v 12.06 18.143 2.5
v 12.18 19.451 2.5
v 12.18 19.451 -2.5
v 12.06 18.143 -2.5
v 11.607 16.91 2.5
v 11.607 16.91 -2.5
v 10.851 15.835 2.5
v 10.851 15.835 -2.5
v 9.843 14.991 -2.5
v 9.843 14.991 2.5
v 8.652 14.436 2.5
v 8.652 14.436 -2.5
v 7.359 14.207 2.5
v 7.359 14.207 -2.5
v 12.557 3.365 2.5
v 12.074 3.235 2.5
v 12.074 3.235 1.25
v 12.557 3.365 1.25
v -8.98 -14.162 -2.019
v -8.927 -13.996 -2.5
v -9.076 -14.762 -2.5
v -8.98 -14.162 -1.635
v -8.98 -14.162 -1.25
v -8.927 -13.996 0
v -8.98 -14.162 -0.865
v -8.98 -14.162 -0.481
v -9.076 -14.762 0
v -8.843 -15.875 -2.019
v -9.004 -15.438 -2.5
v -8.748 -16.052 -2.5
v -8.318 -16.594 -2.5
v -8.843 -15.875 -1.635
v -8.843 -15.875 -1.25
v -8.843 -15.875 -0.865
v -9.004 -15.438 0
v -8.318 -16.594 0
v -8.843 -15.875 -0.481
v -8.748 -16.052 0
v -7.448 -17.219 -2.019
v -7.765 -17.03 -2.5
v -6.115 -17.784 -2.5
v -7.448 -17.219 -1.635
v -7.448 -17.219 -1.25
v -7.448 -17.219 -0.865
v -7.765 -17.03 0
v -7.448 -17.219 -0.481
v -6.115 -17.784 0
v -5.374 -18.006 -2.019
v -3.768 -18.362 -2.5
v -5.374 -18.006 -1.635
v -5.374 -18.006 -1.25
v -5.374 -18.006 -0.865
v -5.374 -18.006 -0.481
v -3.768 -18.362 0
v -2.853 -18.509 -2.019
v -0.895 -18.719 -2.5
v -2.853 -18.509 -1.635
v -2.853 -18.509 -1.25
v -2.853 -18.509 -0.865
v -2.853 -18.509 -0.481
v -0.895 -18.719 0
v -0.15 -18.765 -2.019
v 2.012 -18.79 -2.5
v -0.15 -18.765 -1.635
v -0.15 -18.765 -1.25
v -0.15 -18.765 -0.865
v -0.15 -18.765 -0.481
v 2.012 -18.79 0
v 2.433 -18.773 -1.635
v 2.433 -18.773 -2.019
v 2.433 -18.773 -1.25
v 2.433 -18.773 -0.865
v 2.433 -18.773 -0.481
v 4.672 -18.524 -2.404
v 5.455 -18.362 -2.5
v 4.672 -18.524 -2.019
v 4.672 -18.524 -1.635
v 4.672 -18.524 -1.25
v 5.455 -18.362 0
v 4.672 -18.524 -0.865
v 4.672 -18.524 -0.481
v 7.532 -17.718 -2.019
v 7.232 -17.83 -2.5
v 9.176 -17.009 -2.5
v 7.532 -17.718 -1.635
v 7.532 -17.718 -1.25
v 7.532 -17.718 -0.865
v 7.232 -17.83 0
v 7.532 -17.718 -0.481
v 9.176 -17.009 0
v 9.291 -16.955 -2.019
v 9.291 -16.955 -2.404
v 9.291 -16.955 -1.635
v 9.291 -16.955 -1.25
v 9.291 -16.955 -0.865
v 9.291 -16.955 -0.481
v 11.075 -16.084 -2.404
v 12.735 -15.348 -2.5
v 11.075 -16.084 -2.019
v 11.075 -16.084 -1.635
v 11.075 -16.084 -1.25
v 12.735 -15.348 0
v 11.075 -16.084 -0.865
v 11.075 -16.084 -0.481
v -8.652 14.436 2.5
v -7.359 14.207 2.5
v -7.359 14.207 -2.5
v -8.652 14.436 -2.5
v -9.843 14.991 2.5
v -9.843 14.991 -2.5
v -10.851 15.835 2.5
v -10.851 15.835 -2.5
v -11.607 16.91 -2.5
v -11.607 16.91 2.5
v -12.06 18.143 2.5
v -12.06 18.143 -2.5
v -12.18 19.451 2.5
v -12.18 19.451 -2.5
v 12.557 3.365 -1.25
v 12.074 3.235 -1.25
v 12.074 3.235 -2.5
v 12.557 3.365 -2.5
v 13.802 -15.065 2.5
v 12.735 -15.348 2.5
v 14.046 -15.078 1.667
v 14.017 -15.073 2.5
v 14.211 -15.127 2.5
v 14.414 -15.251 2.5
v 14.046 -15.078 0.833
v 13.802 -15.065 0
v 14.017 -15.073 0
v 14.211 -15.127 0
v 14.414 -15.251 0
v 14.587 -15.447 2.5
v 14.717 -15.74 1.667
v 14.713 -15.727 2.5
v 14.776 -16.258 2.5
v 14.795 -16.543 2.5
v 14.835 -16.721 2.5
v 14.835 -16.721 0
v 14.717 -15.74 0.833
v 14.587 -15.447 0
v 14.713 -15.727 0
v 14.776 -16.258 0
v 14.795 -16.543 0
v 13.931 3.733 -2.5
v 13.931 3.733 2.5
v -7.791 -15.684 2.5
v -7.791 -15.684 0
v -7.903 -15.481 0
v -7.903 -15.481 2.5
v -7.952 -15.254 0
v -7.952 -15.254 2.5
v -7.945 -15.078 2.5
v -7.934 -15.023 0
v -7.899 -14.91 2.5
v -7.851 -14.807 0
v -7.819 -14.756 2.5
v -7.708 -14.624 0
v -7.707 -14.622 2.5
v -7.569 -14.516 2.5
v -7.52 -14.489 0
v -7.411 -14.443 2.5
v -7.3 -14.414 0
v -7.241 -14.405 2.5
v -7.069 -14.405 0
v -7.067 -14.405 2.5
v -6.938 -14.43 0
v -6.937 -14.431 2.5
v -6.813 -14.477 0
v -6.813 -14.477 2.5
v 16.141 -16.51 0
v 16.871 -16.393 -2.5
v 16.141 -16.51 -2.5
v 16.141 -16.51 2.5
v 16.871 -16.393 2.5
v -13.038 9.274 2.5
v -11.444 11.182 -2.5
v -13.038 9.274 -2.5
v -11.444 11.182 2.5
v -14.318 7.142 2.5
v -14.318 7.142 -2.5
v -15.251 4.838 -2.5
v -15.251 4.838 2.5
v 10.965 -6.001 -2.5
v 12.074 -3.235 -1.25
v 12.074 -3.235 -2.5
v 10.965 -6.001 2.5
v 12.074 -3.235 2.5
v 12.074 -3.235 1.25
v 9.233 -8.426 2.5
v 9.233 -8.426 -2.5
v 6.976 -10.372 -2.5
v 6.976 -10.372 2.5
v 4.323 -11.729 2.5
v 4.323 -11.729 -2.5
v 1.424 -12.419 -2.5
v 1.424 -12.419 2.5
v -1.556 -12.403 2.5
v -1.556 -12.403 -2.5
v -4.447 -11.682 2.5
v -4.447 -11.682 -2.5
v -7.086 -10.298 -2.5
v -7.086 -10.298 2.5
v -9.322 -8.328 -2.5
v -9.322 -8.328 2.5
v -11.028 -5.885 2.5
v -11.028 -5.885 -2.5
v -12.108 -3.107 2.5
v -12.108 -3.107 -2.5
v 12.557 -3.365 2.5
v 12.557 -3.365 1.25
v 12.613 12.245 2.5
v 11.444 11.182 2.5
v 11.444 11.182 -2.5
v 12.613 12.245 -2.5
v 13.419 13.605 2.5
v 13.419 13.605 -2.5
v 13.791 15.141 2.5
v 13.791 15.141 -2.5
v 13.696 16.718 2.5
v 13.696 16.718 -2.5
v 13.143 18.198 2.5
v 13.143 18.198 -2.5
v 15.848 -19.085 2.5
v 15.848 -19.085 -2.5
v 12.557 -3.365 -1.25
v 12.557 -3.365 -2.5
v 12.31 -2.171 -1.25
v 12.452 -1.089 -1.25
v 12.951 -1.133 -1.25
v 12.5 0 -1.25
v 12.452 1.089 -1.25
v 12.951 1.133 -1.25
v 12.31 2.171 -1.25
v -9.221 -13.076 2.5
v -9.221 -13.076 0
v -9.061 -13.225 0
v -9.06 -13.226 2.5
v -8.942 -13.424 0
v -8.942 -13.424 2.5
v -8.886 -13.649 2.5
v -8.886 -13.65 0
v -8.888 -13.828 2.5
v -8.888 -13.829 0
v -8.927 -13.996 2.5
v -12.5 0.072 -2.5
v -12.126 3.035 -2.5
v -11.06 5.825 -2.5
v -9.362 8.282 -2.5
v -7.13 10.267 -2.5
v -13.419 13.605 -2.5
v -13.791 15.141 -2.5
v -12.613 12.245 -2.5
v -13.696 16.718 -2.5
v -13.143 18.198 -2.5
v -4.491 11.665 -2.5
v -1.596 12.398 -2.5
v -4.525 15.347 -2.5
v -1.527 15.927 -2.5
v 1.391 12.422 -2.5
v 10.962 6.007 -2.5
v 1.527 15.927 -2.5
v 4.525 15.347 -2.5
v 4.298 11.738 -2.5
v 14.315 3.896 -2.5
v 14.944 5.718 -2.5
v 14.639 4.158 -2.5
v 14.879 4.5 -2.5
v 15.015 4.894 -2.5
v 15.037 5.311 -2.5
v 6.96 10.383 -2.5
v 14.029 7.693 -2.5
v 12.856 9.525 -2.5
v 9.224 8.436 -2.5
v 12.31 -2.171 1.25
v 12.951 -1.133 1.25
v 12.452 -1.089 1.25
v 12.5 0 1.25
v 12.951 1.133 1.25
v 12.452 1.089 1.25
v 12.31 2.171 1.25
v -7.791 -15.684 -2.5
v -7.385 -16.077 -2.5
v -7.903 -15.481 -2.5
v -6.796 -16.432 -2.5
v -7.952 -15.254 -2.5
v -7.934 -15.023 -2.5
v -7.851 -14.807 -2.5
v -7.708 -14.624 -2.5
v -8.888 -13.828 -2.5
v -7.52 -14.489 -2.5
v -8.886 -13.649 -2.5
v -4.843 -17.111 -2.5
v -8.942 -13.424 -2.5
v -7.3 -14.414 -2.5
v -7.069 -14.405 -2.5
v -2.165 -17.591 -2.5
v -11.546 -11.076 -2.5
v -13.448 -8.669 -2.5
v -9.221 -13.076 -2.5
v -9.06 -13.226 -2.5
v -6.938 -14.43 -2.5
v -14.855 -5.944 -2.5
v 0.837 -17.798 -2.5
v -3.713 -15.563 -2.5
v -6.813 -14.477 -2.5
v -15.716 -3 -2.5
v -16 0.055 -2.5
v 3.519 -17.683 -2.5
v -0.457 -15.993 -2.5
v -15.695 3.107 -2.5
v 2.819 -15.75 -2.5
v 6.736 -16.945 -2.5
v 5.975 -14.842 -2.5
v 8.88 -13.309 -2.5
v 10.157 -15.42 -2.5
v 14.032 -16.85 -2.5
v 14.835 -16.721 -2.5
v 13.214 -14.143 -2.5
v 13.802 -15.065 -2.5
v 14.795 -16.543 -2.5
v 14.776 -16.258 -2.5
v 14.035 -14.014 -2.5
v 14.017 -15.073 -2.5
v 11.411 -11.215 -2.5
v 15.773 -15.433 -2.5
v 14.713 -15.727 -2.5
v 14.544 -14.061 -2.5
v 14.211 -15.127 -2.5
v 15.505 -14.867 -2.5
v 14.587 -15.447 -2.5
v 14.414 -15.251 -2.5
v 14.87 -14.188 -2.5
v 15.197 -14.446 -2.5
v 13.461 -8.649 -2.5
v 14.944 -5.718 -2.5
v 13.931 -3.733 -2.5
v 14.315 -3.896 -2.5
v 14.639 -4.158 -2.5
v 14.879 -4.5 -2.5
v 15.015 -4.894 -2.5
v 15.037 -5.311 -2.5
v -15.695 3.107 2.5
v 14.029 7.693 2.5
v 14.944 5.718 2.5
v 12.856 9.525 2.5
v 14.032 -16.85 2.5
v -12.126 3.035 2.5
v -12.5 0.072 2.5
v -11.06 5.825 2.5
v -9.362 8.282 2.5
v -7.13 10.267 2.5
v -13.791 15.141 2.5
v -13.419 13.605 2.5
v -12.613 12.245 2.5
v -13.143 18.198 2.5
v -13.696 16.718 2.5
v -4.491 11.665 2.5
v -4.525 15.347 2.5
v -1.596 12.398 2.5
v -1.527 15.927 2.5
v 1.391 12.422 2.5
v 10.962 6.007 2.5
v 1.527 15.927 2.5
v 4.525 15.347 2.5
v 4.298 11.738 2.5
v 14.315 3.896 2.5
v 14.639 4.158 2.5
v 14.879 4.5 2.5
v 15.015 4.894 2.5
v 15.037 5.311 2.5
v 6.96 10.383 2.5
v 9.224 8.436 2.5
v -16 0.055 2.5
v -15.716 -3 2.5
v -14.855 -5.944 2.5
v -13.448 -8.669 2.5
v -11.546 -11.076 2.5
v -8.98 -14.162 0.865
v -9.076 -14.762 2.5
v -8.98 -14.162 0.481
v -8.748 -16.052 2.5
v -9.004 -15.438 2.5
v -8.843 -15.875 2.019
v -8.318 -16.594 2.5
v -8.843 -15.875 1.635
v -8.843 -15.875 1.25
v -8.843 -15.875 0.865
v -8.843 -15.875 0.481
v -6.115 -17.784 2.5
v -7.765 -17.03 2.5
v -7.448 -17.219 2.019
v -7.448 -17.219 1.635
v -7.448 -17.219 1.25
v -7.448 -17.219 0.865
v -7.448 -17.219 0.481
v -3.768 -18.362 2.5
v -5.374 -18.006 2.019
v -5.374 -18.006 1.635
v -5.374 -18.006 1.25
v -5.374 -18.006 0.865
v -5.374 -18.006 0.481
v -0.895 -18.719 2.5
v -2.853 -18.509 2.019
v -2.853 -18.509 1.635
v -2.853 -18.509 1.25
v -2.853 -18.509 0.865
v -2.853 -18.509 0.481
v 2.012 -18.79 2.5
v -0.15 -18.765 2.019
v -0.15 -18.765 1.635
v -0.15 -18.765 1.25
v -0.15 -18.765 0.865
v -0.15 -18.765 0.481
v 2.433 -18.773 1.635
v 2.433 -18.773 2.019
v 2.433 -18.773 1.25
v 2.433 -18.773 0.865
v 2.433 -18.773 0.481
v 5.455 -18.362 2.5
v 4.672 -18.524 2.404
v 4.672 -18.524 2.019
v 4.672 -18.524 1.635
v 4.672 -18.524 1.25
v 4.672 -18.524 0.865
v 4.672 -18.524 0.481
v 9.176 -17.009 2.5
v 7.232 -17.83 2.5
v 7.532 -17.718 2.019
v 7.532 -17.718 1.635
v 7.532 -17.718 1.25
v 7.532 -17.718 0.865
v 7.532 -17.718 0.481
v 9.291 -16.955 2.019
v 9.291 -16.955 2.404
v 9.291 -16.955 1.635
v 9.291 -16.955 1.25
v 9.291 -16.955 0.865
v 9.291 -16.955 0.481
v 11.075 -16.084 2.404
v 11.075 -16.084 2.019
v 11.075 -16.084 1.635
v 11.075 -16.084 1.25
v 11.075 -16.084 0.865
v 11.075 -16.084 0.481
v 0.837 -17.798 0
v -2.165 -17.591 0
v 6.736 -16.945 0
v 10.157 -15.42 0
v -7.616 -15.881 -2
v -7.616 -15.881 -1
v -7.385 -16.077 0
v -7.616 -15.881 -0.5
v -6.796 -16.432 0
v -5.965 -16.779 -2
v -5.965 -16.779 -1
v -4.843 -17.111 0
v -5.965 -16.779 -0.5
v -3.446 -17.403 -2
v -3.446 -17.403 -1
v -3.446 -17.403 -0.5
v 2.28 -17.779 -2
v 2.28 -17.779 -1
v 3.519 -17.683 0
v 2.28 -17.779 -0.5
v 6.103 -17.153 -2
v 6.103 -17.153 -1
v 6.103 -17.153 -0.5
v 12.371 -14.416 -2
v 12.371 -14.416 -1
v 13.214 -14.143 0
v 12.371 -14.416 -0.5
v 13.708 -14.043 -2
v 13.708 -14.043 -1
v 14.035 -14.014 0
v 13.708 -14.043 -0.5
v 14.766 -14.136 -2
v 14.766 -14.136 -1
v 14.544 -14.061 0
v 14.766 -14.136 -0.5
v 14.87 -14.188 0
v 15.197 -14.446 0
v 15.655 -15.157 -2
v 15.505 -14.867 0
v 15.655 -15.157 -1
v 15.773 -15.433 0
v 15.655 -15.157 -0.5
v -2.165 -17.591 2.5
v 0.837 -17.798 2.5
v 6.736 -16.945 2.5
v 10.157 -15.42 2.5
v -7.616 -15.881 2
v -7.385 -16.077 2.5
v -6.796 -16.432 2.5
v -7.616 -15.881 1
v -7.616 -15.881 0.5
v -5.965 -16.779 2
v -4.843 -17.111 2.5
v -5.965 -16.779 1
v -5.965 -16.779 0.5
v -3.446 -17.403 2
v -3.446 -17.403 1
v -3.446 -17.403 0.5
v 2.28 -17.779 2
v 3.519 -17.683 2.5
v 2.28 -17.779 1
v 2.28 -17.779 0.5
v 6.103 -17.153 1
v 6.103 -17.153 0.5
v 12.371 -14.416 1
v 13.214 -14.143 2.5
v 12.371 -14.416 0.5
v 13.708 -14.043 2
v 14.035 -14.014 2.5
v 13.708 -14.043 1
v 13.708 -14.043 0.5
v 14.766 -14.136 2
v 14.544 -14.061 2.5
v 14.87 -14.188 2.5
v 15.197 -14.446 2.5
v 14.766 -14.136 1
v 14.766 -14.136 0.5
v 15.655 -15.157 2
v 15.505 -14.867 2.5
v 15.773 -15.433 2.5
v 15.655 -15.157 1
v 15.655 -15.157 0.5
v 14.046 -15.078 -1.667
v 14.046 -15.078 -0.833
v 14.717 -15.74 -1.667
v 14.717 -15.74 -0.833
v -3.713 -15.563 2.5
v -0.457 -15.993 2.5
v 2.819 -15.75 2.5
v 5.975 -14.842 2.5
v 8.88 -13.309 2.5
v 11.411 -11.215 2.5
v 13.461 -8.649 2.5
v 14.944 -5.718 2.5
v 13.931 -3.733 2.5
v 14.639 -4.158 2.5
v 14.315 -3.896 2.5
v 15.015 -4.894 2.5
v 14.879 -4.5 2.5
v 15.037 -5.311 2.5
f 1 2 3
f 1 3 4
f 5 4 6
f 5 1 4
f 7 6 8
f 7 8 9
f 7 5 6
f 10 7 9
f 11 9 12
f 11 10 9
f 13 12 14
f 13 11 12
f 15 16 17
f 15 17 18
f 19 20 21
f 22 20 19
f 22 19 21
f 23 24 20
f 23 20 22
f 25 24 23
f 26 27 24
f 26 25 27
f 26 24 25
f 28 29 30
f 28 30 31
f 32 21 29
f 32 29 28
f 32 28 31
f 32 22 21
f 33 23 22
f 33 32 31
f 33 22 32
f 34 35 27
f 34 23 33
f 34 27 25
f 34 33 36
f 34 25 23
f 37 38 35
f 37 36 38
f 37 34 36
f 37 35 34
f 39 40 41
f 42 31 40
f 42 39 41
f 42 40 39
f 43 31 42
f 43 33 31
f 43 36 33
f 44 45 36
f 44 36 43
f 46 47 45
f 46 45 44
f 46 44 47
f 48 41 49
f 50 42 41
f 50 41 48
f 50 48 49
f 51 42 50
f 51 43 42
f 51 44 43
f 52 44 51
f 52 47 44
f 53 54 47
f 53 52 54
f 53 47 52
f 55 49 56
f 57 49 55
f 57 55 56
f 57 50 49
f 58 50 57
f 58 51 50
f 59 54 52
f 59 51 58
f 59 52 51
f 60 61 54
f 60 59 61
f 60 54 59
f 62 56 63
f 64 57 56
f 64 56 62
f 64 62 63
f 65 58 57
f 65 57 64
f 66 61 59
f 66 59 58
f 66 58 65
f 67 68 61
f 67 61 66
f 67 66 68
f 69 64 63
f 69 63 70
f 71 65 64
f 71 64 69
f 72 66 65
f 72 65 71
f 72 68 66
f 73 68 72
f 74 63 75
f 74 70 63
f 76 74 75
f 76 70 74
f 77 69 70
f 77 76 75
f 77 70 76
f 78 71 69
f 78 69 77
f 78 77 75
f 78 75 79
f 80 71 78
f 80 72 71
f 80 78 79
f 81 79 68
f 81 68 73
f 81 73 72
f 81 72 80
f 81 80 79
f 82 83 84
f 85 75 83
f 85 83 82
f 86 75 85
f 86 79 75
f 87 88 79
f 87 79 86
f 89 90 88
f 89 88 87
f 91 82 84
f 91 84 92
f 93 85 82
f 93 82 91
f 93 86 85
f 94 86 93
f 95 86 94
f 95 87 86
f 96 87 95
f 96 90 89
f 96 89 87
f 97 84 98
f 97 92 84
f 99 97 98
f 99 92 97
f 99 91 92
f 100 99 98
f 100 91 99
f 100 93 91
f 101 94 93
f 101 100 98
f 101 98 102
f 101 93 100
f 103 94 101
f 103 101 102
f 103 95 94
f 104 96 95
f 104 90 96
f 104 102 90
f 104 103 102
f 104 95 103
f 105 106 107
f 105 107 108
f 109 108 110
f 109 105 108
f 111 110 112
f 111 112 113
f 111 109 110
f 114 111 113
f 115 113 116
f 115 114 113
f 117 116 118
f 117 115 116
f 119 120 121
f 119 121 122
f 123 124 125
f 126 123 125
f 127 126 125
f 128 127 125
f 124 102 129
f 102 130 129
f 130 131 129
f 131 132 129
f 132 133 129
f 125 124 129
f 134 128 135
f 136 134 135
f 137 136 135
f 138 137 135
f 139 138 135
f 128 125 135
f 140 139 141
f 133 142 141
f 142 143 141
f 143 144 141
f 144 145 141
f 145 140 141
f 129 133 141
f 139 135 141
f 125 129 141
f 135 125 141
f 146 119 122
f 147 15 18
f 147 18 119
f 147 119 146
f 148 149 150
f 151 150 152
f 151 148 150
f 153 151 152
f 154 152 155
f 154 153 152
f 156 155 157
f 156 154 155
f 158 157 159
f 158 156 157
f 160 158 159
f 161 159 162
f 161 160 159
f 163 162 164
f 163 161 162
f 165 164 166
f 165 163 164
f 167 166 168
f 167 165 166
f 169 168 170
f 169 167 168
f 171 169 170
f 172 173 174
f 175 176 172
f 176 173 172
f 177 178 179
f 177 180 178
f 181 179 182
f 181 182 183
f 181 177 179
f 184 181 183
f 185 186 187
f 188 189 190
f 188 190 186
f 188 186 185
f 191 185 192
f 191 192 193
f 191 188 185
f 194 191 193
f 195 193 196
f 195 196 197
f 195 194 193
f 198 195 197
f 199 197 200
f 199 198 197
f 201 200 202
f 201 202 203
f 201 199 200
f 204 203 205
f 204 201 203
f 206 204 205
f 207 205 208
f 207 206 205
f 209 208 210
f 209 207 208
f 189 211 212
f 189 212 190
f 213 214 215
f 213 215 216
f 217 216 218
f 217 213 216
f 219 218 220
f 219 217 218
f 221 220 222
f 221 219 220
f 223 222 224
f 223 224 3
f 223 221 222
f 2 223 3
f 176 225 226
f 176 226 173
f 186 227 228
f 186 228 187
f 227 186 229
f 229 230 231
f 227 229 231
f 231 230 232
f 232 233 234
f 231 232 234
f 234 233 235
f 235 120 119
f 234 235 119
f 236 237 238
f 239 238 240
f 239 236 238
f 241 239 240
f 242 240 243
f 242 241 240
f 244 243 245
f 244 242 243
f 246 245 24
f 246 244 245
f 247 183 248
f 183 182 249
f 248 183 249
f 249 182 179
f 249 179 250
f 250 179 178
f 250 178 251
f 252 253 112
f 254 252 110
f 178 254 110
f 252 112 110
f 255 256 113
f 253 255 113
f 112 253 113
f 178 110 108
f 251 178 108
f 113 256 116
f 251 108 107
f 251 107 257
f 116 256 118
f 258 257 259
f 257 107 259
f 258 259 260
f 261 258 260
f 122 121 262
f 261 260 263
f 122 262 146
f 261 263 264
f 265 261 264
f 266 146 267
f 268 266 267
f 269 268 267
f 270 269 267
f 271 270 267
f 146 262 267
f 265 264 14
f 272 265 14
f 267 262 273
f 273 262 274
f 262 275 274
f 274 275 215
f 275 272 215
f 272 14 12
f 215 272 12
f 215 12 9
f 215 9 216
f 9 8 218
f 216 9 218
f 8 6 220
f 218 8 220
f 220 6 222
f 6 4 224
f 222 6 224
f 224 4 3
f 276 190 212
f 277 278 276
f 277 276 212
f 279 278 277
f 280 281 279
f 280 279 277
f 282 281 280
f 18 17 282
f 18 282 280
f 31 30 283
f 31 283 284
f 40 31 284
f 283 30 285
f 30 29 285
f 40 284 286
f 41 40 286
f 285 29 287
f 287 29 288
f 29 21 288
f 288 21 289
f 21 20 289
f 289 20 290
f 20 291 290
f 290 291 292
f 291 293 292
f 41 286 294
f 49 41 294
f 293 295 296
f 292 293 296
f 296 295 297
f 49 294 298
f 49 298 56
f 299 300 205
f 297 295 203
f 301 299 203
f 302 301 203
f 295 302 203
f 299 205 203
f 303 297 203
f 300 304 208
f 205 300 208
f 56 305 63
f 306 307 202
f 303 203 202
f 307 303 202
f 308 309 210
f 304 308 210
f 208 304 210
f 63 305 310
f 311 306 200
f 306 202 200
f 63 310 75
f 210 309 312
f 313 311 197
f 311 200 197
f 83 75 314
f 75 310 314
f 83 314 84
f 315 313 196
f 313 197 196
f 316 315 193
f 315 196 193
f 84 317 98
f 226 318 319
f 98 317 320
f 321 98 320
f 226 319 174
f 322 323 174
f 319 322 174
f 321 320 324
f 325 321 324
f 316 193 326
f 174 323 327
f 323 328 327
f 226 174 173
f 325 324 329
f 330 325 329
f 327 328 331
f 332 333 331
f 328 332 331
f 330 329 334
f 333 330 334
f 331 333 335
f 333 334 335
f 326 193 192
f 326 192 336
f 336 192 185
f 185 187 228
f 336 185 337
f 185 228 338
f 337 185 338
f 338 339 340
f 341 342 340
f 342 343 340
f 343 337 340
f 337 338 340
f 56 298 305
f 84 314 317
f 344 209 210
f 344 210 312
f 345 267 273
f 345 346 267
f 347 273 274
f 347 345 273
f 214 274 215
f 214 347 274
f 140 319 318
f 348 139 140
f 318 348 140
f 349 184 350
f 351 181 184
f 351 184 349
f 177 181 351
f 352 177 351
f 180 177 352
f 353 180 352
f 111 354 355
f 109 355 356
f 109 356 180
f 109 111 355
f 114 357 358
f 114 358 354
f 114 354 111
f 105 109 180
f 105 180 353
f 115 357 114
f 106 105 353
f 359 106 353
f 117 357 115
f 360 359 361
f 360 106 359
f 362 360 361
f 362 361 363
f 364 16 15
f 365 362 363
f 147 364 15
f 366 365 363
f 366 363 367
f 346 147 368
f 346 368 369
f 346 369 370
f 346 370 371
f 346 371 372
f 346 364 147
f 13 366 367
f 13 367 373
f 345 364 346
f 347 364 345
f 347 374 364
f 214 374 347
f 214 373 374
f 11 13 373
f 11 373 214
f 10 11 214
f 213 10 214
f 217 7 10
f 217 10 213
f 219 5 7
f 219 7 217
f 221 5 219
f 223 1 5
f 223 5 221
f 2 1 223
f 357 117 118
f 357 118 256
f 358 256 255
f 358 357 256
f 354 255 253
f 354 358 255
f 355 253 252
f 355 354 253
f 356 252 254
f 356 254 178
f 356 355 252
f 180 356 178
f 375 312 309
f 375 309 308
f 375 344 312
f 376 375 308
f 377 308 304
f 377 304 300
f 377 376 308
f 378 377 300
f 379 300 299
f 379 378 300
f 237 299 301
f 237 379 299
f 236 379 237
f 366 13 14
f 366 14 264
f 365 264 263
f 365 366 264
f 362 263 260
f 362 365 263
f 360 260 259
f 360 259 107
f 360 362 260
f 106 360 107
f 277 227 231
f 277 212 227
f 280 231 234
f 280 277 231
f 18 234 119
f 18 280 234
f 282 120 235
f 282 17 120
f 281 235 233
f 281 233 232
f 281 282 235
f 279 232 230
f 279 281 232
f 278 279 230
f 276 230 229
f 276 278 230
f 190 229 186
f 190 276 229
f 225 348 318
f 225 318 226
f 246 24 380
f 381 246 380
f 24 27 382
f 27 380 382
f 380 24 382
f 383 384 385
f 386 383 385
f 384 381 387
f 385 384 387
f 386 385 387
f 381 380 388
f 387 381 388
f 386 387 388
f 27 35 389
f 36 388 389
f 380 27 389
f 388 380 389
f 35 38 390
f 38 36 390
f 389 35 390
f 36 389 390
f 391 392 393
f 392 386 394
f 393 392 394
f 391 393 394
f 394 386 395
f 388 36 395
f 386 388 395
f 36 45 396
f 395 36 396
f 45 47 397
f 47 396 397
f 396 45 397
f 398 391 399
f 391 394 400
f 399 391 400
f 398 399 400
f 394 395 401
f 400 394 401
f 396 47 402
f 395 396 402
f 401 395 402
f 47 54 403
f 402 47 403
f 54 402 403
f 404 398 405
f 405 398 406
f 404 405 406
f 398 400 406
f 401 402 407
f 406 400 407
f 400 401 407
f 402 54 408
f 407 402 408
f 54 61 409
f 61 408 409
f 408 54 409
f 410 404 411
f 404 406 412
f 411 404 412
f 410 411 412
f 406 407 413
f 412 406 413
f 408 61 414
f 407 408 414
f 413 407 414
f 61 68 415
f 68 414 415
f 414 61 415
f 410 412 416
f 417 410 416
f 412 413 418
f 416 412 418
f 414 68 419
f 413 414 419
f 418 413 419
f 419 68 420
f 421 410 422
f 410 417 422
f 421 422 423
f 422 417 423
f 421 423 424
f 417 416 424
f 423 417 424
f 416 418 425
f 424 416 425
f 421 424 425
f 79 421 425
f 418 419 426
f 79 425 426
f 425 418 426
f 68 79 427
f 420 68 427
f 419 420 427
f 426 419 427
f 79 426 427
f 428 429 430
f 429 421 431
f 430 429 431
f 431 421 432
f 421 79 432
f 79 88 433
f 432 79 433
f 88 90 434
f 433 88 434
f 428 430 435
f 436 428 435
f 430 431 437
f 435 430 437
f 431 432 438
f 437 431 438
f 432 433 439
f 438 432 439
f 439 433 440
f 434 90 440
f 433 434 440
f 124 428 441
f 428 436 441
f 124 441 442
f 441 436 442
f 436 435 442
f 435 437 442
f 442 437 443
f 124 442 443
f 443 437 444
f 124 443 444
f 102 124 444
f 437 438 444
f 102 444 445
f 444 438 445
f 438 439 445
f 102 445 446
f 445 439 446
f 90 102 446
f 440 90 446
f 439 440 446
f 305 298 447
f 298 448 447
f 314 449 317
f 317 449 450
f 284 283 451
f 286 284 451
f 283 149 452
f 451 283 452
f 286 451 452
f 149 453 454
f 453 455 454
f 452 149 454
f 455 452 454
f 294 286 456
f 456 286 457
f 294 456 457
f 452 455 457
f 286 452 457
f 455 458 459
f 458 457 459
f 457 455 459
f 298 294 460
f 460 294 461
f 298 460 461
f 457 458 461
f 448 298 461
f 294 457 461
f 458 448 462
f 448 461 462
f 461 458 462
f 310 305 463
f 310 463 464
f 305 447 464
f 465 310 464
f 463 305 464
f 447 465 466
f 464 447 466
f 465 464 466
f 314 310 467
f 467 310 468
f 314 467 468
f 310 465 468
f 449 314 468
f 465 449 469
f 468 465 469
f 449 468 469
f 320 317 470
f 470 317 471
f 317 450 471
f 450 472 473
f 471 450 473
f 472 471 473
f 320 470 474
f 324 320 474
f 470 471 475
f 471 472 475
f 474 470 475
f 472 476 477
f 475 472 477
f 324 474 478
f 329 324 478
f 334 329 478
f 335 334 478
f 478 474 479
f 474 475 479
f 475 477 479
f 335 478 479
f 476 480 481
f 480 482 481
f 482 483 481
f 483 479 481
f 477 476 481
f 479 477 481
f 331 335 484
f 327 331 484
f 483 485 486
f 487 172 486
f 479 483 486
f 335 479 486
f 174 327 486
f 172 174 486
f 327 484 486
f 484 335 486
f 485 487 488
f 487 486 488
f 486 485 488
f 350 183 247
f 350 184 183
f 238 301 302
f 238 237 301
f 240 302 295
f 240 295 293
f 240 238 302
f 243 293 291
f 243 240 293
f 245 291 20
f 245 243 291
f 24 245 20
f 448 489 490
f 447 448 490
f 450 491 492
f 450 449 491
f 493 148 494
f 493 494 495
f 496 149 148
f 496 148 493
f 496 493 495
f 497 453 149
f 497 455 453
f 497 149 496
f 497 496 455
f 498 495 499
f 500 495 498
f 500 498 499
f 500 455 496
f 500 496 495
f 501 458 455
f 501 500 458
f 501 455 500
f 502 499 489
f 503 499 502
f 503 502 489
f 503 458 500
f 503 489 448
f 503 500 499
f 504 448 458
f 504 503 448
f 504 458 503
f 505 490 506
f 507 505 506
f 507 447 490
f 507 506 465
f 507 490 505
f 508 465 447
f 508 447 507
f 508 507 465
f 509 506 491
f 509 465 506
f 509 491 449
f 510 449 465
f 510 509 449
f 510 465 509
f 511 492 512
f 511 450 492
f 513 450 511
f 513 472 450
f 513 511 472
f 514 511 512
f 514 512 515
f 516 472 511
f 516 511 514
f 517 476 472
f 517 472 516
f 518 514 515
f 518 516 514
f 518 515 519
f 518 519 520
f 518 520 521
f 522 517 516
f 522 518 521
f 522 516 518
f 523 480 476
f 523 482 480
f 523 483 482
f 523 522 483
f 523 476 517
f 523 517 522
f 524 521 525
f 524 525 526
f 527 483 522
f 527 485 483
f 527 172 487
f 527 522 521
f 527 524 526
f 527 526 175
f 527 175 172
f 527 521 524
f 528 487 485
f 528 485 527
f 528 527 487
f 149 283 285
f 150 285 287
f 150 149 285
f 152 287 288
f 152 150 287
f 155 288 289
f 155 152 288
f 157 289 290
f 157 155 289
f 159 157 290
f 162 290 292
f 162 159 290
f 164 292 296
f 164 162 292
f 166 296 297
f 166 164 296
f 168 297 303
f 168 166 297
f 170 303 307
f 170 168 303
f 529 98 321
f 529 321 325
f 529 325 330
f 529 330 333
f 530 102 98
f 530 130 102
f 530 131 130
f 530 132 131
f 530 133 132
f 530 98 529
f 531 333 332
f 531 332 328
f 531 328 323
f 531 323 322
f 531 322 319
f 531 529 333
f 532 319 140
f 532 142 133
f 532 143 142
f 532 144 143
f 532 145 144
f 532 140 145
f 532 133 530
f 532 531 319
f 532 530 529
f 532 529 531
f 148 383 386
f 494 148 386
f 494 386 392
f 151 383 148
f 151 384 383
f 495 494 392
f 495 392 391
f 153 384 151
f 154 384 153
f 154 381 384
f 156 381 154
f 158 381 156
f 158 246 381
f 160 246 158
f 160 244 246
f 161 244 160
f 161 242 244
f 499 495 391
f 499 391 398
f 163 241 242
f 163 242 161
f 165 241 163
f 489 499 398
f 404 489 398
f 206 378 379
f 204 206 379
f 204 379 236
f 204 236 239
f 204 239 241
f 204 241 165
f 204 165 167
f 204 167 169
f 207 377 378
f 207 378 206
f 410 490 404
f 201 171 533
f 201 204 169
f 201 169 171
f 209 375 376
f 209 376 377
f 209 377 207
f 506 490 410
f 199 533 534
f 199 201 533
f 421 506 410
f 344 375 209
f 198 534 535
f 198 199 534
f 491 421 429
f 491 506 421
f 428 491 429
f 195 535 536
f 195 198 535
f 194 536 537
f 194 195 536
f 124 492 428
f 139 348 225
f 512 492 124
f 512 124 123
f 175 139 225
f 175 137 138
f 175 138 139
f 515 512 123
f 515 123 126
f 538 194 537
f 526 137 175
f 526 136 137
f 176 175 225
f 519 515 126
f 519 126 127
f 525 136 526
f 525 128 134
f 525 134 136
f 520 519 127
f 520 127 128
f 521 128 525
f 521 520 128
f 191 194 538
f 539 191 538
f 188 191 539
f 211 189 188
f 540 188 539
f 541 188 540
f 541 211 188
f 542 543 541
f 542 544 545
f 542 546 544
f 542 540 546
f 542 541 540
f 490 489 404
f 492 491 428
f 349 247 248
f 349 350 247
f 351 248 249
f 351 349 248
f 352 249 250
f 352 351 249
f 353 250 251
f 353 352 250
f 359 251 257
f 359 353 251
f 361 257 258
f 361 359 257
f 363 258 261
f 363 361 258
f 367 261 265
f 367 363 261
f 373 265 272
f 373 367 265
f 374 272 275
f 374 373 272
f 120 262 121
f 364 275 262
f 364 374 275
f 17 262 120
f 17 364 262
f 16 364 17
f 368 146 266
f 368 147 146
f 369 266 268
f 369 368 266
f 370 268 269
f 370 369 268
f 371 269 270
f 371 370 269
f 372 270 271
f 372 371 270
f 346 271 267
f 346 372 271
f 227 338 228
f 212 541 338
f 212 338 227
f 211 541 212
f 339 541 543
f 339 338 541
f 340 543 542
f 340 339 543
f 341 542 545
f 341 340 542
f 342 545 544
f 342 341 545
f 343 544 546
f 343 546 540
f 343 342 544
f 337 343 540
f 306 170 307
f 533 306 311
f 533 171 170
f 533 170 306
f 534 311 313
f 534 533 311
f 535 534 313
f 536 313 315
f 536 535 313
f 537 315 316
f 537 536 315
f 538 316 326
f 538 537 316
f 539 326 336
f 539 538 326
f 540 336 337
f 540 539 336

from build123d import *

# Parameters (mm, degrees)
F1_DEPTH = 2.5
F2_DEPTH = 1.25
F3_R     = 1.5
F4_DEPTH = 2.5
F5_R     = 0.8


# Not quite as in the source:
# - ends of sketch curves that miss each other by under 0.0002 mm in the source are joined
# - the dataset's text gives a spline's control points without its knots; the knots are read off the source's solid


with BuildPart() as f1:
    # F0 (on Top) → F1 (new body, symmetric)
    with BuildSketch(Plane.XY):
        with BuildLine():
            ThreePointArc((-12.4997921931, 0.0720772397), (-1.5958401687, 12.3977132632), (12.0740728286, 3.2352380638))
            Line((12.0740728286, 3.2352380638), (12.5570357418, 3.3646475863))
            Line((12.5570357418, 3.3646475863), (15.4548132206, 4.1411047216))
            ThreePointArc((15.4548132206, 4.1411047216), (13.9025925761, 7.9194646071), (11.4442382915, 11.1816550621))
            ThreePointArc((11.4442382915, 11.1816550621), (9.5223590052, 12.8578644796), (7.3585783975, 14.2074390362))
            ThreePointArc((7.3585783975, 14.2074390362), (0, 16), (-7.3585783975, 14.2074390362))
            ThreePointArc((-7.3585783975, 14.2074390362), (-9.5223590052, 12.8578644796), (-11.4442382915, 11.1816550621))
            ThreePointArc((-11.4442382915, 11.1816550621), (-13.7194334915, 8.2326875729), (-15.2511574536, 4.8375816609))
            Line((-15.2511574536, 4.8375816609), (-12.4997921931, 0.0720772397))
        make_face()
        with BuildLine():
            ThreePointArc((-12.1797463165, 19.4514751915), (-13.7905135345, 15.1405977877), (-11.4442382915, 11.1816550621))
            ThreePointArc((-11.4442382915, 11.1816550621), (-9.5223590052, 12.8578644796), (-7.3585783975, 14.2074390362))
            ThreePointArc((-7.3585783975, 14.2074390362), (-10.8510358044, 15.8348237051), (-12.1797463165, 19.4514751915))
        make_face()
        with BuildLine():
            ThreePointArc((7.3585783975, 14.2074390362), (9.5223590052, 12.8578644796), (11.4442382915, 11.1816550621))
            ThreePointArc((11.4442382915, 11.1816550621), (13.7905135345, 15.1405977877), (12.1797463165, 19.4514751915))
            ThreePointArc((12.1797463165, 19.4514751915), (10.8510358044, 15.8348237051), (7.3585783975, 14.2074390362))
        make_face()
    extrude(amount=F1_DEPTH, both=True)



with BuildPart() as f1b:
    # F0 (on Top) → F1, piece 2 (new body, symmetric)
    with BuildSketch(Plane.XY):
        with BuildLine():
            Line((12.5570357418, -3.3646475863), (12.0740728286, -3.2352380638))
            ThreePointArc((12.0740728286, -3.2352380638), (-0.0662546533, -12.4998244116), (-12.1076898624, -3.107063919))
            Line((-12.1076898624, -3.107063919), (-15.6954182424, 3.107063919))
            ThreePointArc((-15.6954182424, 3.107063919), (-14.7280011146, -6.2518783712), (-8.6675896137, -13.4488992222))
            ThreePointArc((-8.6675896137, -13.4488992222), (-8.2430782578, -13.7131929483), (-7.8105150545, -13.9640916133))
            ThreePointArc((-7.8105150545, -13.9640916133), (6.2234710156, -14.740027426), (15.4548132206, -4.1411047216))
            Line((15.4548132206, -4.1411047216), (12.5570357418, -3.3646475863))
        make_face()
        with BuildLine():
            ThreePointArc((-7.8105150545, -13.9640916133), (-8.2430782578, -13.7131929483), (-8.6675896137, -13.4488992222))
            add(Edge.make_bspline(
                [(-8.6675896137, -13.4488992222), (-8.797764652, -13.6654585416), (-9.0152035334, -14.1398334202), (-9.1106271715, -14.8441369677), (-9.019453346, -15.4402355626), (-8.8577356601, -15.8805060204), (-8.606122993, -16.2902925258), (-8.2704537018, -16.6576498092), (-7.8814651413, -16.9636616263), (-7.3119803281, -17.3112660682), (-6.5035804076, -17.6685037974), (-5.3935521754, -18.017298843), (-4.1682718306, -18.2991057591), (-2.8605703232, -18.5187890962), (-1.5067823109, -18.6776427369), (-0.1448831469, -18.7755760581), (1.1866806091, -18.811715906), (2.4507043421, -18.7843156845), (3.6107265904, -18.6908897447), (4.6838851631, -18.5342313543), (6.0200948318, -18.2454330252), (7.2429524692, -17.8461078269), (8.4161128097, -17.360744608), (9.2884492722, -16.9607714916), (10.1788682347, -16.5256334939), (11.0786073367, -16.0789478737), (11.9458288341, -15.6684730299), (12.4853133495, -15.4419413174), (12.735188331, -15.3475727395)],
                knots=[0, 0, 0, 0, 0.03125, 0.0625, 0.078125, 0.09375, 0.109375, 0.125, 0.140625, 0.15625, 0.1875, 0.21875, 0.25, 0.28125, 0.3125, 0.34375, 0.375, 0.40625, 0.4375, 0.46875, 0.5, 0.5625, 0.59375, 0.625, 0.65625, 0.6875, 0.71875, 0.7488919453, 0.7488919453, 0.7488919453, 0.7488919453], degree=3))
            add(Edge.make_bspline(
                [(12.735188331, -15.3475727395), (13.0962225988, -15.2263056252), (14.0987647195, -14.8169575852), (14.8734039357, -15.6872366698), (14.744015393, -16.4765788546), (14.8353977892, -16.7206706709)],
                knots=[0, 0, 0, 0, 0.3705867105, 0.6816060498, 1, 1, 1, 1], degree=3))
            Line((14.8353977892, -16.7206706709), (16.1413460697, -16.5104982377))
            add(Edge.make_bspline(
                [(-7.8105150545, -13.9640916133), (-8.1627060189, -14.5499968418), (-8.3932358627, -16.9546025127), (3.0722998689, -18.5185205906), (8.7653437405, -16.2477641355), (15.1718434378, -12.7619138207), (15.864960823, -15.7065625014), (16.1413460697, -16.5104982377)],
                knots=[0, 0, 0, 0, 0.1227588113, 0.403467238, 0.6434540436, 0.8535085955, 1, 1, 1, 1], degree=3))
        make_face()
        Polygon((16.8711597868, -16.3930458647), (16.1413460697, -16.5104982377), (14.8353977892, -16.7206706709), (14.0320850357, -16.8499515915), (15.8481355757, -19.0853122622), align=None)
    extrude(amount=F1_DEPTH, both=True)


with BuildPart() as f1_1:
    add(f1.part)

    add(f1b.part)  # F2 merges F1b
    # F0 (on Top) → F2 (join, symmetric)
    with BuildSketch(Plane.XY):
        with BuildLine():
            ThreePointArc((12.0740728286, 3.2352380638), (12.3930607672, 1.6315774028), (12.5, 0))
            ThreePointArc((12.5, 0), (12.3930607672, -1.6315774028), (12.0740728286, -3.2352380638))
            Line((12.0740728286, -3.2352380638), (12.5570357418, -3.3646475863))
            ThreePointArc((12.5570357418, -3.3646475863), (13, 0), (12.5570357418, 3.3646475863))
            Line((12.5570357418, 3.3646475863), (12.0740728286, 3.2352380638))
        make_face()
    extrude(amount=F2_DEPTH, both=True)

    # F3
    f3_edges = [f1_1.edges().sort_by_distance(p)[0] for p in [
        (15.454813, -4.141105, 0),
        (15.454813, 4.141105, 0),
    ]]
    fillet(f3_edges, radius=F3_R)

    # F0 (on Top) → F4 (cut, symmetric)
    with BuildSketch(Plane.XY):
        with BuildLine():
            ThreePointArc((12.0740728286, -3.2352380638), (12.3930607672, -1.6315774028), (12.5, 0))
            ThreePointArc((12.5, 0), (12.3930607672, 1.6315774028), (12.0740728286, 3.2352380638))
            ThreePointArc((12.0740728286, 3.2352380638), (-1.5958401687, 12.3977132632), (-12.4997921931, 0.0720772397))
            ThreePointArc((-12.4997921931, 0.0720772397), (-12.4059976586, -1.5301052563), (-12.1076898624, -3.107063919))
            ThreePointArc((-12.1076898624, -3.107063919), (-0.0662546533, -12.4998244116), (12.0740728286, -3.2352380638))
        make_face()
    extrude(amount=F4_DEPTH, both=True, mode=Mode.SUBTRACT)

    # F5
    f5_edges = [f1_1.edges().sort_by_distance(p)[0] for p in [
        (-7.810515, -13.964092, 1.25),
        (-7.810515, -13.964092, -1.25),
        (-8.66759, -13.448899, 1.25),
        (-8.66759, -13.448899, -1.25),
    ]]
    fillet(f5_edges, radius=F5_R)


solid = f1_1.part
